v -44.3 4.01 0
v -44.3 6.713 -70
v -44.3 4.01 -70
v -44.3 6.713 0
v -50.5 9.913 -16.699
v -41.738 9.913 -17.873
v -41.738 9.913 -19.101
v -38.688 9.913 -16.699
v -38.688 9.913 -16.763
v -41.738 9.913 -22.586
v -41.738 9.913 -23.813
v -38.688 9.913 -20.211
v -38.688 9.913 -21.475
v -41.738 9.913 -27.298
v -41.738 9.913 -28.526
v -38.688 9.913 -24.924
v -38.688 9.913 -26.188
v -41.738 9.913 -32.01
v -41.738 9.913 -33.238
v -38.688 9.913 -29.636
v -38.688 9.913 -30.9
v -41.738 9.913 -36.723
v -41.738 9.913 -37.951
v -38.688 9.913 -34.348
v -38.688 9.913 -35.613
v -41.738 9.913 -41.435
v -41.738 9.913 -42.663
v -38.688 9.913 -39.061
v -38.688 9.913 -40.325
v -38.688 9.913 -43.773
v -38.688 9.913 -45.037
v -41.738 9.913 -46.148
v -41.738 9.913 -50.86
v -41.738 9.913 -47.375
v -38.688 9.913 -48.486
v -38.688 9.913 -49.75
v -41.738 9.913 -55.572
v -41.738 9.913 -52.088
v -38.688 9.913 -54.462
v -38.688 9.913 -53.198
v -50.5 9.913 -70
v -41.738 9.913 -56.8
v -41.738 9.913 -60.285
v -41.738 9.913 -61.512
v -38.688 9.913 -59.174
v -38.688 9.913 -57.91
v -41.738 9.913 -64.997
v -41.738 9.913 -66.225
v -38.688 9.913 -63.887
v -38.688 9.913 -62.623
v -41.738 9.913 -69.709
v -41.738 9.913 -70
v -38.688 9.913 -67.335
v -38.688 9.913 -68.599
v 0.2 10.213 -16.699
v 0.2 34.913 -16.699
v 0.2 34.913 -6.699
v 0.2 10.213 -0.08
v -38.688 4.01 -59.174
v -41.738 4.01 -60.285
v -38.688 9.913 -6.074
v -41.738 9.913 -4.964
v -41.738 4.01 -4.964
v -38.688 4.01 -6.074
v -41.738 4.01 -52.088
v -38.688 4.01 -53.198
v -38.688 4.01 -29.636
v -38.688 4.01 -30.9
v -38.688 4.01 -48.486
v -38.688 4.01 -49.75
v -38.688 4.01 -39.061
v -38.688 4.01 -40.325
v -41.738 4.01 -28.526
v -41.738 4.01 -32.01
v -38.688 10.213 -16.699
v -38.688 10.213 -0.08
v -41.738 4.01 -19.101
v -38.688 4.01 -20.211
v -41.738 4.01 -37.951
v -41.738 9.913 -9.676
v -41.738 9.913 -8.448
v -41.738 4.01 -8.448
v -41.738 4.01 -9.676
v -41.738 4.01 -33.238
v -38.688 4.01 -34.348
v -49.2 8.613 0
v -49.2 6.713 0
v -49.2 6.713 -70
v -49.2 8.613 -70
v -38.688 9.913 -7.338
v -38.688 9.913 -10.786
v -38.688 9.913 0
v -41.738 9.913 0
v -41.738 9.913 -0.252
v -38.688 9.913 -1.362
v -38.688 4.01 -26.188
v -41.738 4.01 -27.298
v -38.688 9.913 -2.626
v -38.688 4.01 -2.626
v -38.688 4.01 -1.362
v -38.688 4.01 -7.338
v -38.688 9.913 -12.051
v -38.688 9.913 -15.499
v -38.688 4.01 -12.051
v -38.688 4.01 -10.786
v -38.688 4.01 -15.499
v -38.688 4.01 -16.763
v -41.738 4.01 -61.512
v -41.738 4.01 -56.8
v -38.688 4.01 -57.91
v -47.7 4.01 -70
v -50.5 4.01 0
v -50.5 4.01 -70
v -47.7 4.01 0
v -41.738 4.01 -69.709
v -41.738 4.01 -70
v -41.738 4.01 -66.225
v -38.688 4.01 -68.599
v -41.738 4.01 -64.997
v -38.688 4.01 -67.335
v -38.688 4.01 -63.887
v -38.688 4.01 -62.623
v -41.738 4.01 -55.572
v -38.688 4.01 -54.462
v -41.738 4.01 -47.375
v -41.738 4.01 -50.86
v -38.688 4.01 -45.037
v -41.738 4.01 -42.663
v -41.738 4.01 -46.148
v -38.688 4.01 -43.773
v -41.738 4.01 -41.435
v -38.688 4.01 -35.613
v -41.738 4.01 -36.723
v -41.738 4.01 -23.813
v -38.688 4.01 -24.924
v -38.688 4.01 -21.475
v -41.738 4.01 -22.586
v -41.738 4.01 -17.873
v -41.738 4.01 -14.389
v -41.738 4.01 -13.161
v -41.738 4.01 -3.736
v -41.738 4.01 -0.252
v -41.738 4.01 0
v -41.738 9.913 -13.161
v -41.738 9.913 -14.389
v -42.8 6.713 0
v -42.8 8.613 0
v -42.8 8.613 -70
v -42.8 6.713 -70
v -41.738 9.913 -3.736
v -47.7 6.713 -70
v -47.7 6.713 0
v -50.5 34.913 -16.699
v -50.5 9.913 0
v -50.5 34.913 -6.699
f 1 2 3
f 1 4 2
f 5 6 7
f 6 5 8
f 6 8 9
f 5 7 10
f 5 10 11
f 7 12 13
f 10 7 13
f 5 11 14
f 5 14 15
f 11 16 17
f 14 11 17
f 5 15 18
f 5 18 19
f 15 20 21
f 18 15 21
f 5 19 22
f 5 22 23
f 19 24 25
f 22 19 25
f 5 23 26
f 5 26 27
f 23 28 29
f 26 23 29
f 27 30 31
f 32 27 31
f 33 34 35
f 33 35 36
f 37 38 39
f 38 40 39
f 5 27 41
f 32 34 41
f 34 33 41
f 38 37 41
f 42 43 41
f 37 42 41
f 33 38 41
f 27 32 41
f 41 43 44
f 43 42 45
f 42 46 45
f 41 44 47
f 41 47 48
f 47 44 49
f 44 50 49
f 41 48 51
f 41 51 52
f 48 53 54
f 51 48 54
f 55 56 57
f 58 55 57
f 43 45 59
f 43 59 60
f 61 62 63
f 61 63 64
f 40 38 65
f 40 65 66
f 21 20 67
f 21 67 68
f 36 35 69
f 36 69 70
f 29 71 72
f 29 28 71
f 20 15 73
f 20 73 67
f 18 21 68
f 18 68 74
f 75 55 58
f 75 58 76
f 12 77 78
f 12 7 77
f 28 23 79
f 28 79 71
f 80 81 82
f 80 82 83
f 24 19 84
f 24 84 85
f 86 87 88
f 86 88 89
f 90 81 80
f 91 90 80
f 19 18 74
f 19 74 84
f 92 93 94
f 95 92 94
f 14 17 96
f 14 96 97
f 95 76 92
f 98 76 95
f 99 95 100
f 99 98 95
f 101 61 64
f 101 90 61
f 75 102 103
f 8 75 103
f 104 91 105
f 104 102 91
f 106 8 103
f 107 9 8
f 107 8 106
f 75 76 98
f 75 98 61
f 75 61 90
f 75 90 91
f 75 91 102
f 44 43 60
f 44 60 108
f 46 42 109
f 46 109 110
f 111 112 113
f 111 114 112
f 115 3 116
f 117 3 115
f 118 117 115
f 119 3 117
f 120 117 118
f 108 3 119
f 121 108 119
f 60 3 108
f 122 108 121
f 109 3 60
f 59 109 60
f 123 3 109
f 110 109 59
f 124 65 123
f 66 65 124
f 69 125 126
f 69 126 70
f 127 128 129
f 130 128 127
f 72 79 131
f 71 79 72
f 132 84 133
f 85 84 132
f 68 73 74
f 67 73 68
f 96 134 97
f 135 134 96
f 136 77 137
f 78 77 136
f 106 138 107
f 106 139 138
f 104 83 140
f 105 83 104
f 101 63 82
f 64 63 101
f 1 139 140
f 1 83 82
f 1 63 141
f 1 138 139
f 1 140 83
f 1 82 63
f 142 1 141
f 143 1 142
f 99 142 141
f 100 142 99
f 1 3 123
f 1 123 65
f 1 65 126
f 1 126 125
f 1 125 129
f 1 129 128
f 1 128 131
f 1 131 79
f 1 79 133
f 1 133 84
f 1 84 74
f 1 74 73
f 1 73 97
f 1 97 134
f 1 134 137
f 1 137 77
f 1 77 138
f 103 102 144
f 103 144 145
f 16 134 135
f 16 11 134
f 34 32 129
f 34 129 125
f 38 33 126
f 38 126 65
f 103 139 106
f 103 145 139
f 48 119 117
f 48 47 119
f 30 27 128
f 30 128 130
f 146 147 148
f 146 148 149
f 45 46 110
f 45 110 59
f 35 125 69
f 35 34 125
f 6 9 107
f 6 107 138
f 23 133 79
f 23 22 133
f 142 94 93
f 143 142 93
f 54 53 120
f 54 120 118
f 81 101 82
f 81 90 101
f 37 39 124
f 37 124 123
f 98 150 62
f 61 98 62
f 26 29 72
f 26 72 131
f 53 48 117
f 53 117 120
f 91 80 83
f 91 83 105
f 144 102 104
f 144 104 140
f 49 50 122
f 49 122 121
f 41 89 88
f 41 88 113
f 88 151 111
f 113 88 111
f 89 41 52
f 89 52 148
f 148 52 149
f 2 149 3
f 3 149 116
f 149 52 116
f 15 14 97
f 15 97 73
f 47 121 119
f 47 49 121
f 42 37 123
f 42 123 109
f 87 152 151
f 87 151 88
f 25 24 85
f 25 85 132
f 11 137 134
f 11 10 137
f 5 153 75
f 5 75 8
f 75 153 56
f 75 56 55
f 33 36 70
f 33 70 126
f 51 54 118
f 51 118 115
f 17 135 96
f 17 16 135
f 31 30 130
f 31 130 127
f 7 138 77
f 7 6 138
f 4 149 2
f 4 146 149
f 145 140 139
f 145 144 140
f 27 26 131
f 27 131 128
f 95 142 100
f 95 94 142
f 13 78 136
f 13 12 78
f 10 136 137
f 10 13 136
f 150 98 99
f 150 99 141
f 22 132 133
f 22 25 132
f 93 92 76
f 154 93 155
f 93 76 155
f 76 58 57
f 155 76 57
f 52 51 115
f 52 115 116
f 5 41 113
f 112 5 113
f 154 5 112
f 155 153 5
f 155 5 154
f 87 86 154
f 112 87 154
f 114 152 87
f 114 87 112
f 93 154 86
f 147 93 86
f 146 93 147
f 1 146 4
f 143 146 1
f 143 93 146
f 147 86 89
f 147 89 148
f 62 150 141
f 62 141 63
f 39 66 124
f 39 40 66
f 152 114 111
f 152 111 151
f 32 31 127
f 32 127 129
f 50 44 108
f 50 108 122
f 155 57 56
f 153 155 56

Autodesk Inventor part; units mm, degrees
ref_plane "YZ Plane" through (0, 0, 0) normal (1, 0, 0) x (0, 1, 0)
ref_plane "XZ Plane" through (0, 0, 0) normal (0, 1, 0) x (-1, 0, 0)
sketch "草圖1" plane through (0, 0, 0) normal (0, 0, 1) x (1, 0, 0)
  line L0 (0, -4.2926) -> (-50, -4.2926) projected
  line L1 (0, -4.2926) -> (0, 3.81) projected
  line L2 (0, 3.81) -> (-2.5, 3.81) projected
  line L3 (-2.5, 3.81) -> (-2.5, 6.9129) projected
  line L4 (-2.5, 6.9129) -> (-1, 6.9129) projected
  line L5 (-1, 6.9129) -> (-1, 8.4129) projected
  line L6 (-1, 8.4129) -> (-7, 8.4129) projected
  line L7 (-7, 8.4129) -> (-7, 6.9129) projected
  line L8 (-7, 6.9129) -> (-5.5, 6.9129) projected
  line L9 (-5.5, 6.9129) -> (-5.5, 3.81) projected
  line L10 (-5.5, 3.81) -> (-44.5, 3.81) projected
  line L11 (-44.5, 3.81) -> (-44.5, 6.9129) projected
  line L12 (-44.5, 6.9129) -> (-43, 6.9129) projected
  line L13 (-43, 6.9129) -> (-43, 8.4129) projected
  line L14 (-43, 8.4129) -> (-49, 8.4129) projected
  line L15 (-49, 8.4129) -> (-49, 6.9129) projected
  line L16 (-49, 6.9129) -> (-47.5, 6.9129) projected
  line L17 (-47.5, 6.9129) -> (-47.5, 3.81) projected
  line L18 (-47.5, 3.81) -> (-50, 3.81) projected
  line L19 (-50, -4.2926) -> (-50, 3.81) projected
  line L20 (-44.3, 6.7129) -> (-44.3, 4.01)
  line L21 (-44.3, 4.01) -> (-5.7, 4.01)
  line L22 (-5.7, 4.01) -> (-5.7, 6.7129)
  line L23 (-5.7, 6.7129) -> (-7.2, 6.7129)
  line L24 (-7.2, 6.7129) -> (-7.2, 8.6129)
  line L25 (-7.2, 8.6129) -> (-0.8, 8.6129)
  line L26 (-0.8, 8.6129) -> (-0.8, 6.7129)
  line L27 (-0.8, 6.7129) -> (-2.3, 6.7129)
  line L28 (-2.3, 6.7129) -> (-2.3, 4.01)
  line L29 (-2.3, 4.01) -> (0.2, 4.01)
  line L30 (0.2, 4.01) -> (0.2, -4.4926)
  line L31 (0.2, -4.4926) -> (-50.2, -4.4926)
  line L32 (-50.2, -4.4926) -> (-50.2, 4.01)
  line L33 (-50.2, 4.01) -> (-47.7, 4.01)
  line L34 (-47.7, 4.01) -> (-47.7, 6.7129)
  line L35 (-47.7, 6.7129) -> (-49.2, 6.7129)
  line L36 (-49.2, 6.7129) -> (-49.2, 8.6129)
  line L37 (-49.2, 8.6129) -> (-42.8, 8.6129)
  line L38 (-42.8, 8.6129) -> (-42.8, 6.7129)
  line L39 (-42.8, 6.7129) -> (-44.3, 6.7129)
  line L40 (-50.2, 4.01) -> (-50.2, 9.9129)
  line L41 (-50.2, 9.9129) -> (-41.8, 9.9129)
  line L42 (-41.8, 9.9129) -> (-41.8, 4.01)
  line L43 (-41.8, 6.7405) -> (-41.8, 4.0405)
  point P0 (0, 0)
  point P1 (-41.8, 5.3905)
  dimension "d0" = 0.2
  dimension "d3" = 1
  dimension "d4" = 1.3
ref_plane "工作平面1" through (-50, -4.2926, -70) normal (0, 0, -1) x (0, 1, 0)
extrude "擠出1" add sketch "草圖1" against normal up to surface (70 mm away) contours L39 L38 L37 L36 L35 L34 L33 L40 L41 L42 L21 L20
sketch "草圖2" plane through (-50.2, 9.9129, 0) normal (0, 1, 0) x (1, 0, 0)
  line L0 (8.4617, 19.101) -> (11.5117, 20.2111)
  line L1 (11.5117, 20.2111) -> (11.5117, 21.4754)
  line L2 (11.5117, 21.4754) -> (8.4617, 22.5855)
  line L3 (8.4617, 22.5855) -> (8.4617, 23.8134)
  line L4 (8.4617, 23.8134) -> (11.5117, 24.9235)
  line L5 (11.5117, 24.9235) -> (11.5117, 26.1878)
  line L6 (11.5117, 26.1878) -> (8.4617, 27.2979)
  line L7 (8.4617, 27.2979) -> (8.4617, 28.5258)
  line L8 (8.4617, 28.5258) -> (11.5117, 29.6359)
  line L9 (11.5117, 29.6359) -> (11.5117, 30.9002)
  line L10 (11.5117, 30.9002) -> (8.4617, 32.0103)
  line L11 (8.4617, 32.0103) -> (8.4617, 33.2382)
  line L12 (8.4617, 33.2382) -> (11.5117, 34.3483)
  line L13 (11.5117, 34.3483) -> (11.5117, 35.6126)
  line L14 (11.5117, 35.6126) -> (8.4617, 36.7227)
  line L15 (8.4617, 36.7227) -> (8.4617, 37.9506)
  line L16 (8.4617, 37.9506) -> (11.5117, 39.0607)
  line L17 (11.5117, 39.0607) -> (11.5117, 40.325)
  line L18 (11.5117, 40.325) -> (8.4617, 41.4351)
  line L19 (8.4617, 41.4351) -> (8.4617, 42.663)
  line L20 (8.4617, 42.663) -> (11.5117, 43.7731)
  line L21 (11.5117, 43.7731) -> (11.5117, 45.0373)
  line L22 (11.5117, 45.0373) -> (8.4617, 46.1475)
  line L23 (8.4617, 46.1475) -> (8.4617, 47.3753)
  line L24 (8.4617, 47.3753) -> (11.5117, 48.4855)
  line L25 (11.5117, 48.4855) -> (11.5117, 49.7497)
  line L26 (11.5117, 49.7497) -> (8.4617, 50.8598)
  circle A0 centre (25.2, 35) radius 1.15 projected
  spline S0 degree 3 poles (28.303, 18.8298) (28.3918, 19.076) (28.7004, 19.9315) (28.7388, 21.2949) (28.6496, 21.419) (28.6524, 21.7961) (28.6611, 21.9313) (28.7622, 22.2015) (28.8309, 22.282) (28.9256, 22.387) (29.0049, 22.4333) (29.139, 22.5114) (29.2816, 22.5522) (29.5147, 22.6052) (29.6038, 22.5977) (29.679, 22.5914) (29.7699, 22.5777) (29.9387, 22.4894) (30.0374, 22.4306) (30.278, 22.1628) (30.3615, 21.9889) (30.5339, 21.6254) (30.761, 21.3363) (31.4807, 20.5784) (31.9907, 20.2322) (32.1942, 20.0941) knots 0 0 0 0 0.078525 0.078525 0.123346 0.123346 0.136441 0.136441 0.149096 0.149096 0.177084 0.177084 0.558526 0.558526 0.807734 0.807734 2.330173 2.330173 3.026337 3.026337 3.902772 3.902772 11.004243 11.004243 24.626338 24.626338 24.626338 24.626338 projected
  arc A1 (32.1942, 20.0941) -> (33.148, 20.5801) centre (25.2, 35) ccw projected
  spline S1 degree 3 poles (33.148, 20.5801) (33.1564, 20.8417) (33.1855, 21.7507) (32.8007, 23.0592) (32.6775, 23.1497) (32.5637, 23.5092) (32.5301, 23.6405) (32.5428, 23.9287) (32.5833, 24.0265) (32.6409, 24.1556) (32.702, 24.2241) (32.8054, 24.3399) (32.9285, 24.4227) (33.1337, 24.5452) (33.2208, 24.5656) (33.2942, 24.5828) (33.3849, 24.5979) (33.5727, 24.566) (33.6848, 24.5406) (33.9964, 24.3602) (34.1295, 24.2207) (34.4058, 23.9282) (34.7112, 23.7235) (35.6298, 23.2251) (36.2218, 23.0535) (36.458, 22.985) knots 0 0 0 0 0.078525 0.078525 0.123346 0.123346 0.136441 0.136441 0.149096 0.149096 0.177084 0.177084 0.558526 0.558526 0.807734 0.807734 2.330173 2.330173 3.026337 3.026337 3.902772 3.902772 11.004243 11.004243 24.626338 24.626338 24.626338 24.626338 projected
  arc A2 (36.458, 22.985) -> (37.215, 23.742) centre (25.2, 35) ccw projected
  spline S2 degree 3 poles (37.215, 23.742) (37.1421, 23.9934) (36.889, 24.8668) (36.1186, 25.9924) (35.9735, 26.0404) (35.7541, 26.3471) (35.6817, 26.4616) (35.6047, 26.7396) (35.6129, 26.8451) (35.6278, 26.9857) (35.6648, 27.0698) (35.7273, 27.2118) (35.8188, 27.3286) (35.9762, 27.5085) (36.0526, 27.5549) (36.1172, 27.5939) (36.1988, 27.6363) (36.3872, 27.664) (36.5016, 27.6744) (36.8537, 27.5992) (37.0234, 27.5077) (37.3766, 27.3148) (37.7303, 27.2145) (38.758, 27.0244) (39.3741, 27.0441) (39.6199, 27.052) knots 0 0 0 0 0.078525 0.078525 0.123346 0.123346 0.136441 0.136441 0.149096 0.149096 0.177084 0.177084 0.558526 0.558526 0.807734 0.807734 2.330173 2.330173 3.026337 3.026337 3.902772 3.902772 11.004243 11.004243 24.626338 24.626338 24.626338 24.626338 projected
  arc A3 (39.6199, 27.052) -> (40.1059, 28.0058) centre (25.2, 35) ccw projected
  spline S3 degree 3 poles (40.1059, 28.0058) (39.9589, 28.2224) (39.4482, 28.9749) (38.3677, 29.8073) (38.2149, 29.8081) (37.9115, 30.032) (37.8072, 30.1185) (37.648, 30.3591) (37.6233, 30.462) (37.594, 30.6003) (37.6032, 30.6917) (37.6187, 30.8461) (37.6696, 30.9855) (37.7637, 31.2052) (37.8221, 31.2729) (37.8714, 31.33) (37.9359, 31.3955) (38.1066, 31.4801) (38.2122, 31.5254) (38.5703, 31.5626) (38.76, 31.528) (39.1555, 31.4538) (39.5228, 31.4677) (40.559, 31.6044) (41.1388, 31.8135) (41.3702, 31.897) knots 0 0 0 0 0.078525 0.078525 0.123346 0.123346 0.136441 0.136441 0.149096 0.149096 0.177084 0.177084 0.558526 0.558526 0.807734 0.807734 2.330173 2.330173 3.026337 3.026337 3.902772 3.902772 11.004243 11.004243 24.626338 24.626338 24.626338 24.626338 projected
  arc A4 (41.3702, 31.897) -> (41.5376, 32.9543) centre (25.2, 35) ccw projected
  spline S4 degree 3 poles (41.5376, 32.9543) (41.3309, 33.1148) (40.6127, 33.6727) (39.3279, 34.1305) (39.1823, 34.0841) (38.8245, 34.2032) (38.6986, 34.2532) (38.4729, 34.4329) (38.4176, 34.5231) (38.3469, 34.6456) (38.3275, 34.7353) (38.2946, 34.887) (38.2999, 35.0353) (38.3215, 35.2733) (38.3561, 35.3558) (38.3854, 35.4253) (38.4264, 35.5076) (38.5627, 35.6407) (38.6491, 35.7164) (38.9781, 35.8625) (39.1693, 35.8882) (39.5683, 35.9398) (39.9134, 36.0665) (40.8566, 36.5168) (41.3434, 36.8949) (41.5376, 37.0457) knots 0 0 0 0 0.078525 0.078525 0.123346 0.123346 0.136441 0.136441 0.149096 0.149096 0.177084 0.177084 0.558526 0.558526 0.807734 0.807734 2.330173 2.330173 3.026337 3.026337 3.902772 3.902772 11.004243 11.004243 24.626338 24.626338 24.626338 24.626338 projected
  arc A5 (41.5376, 37.0457) -> (41.3702, 38.103) centre (25.2, 35) ccw projected
  spline S5 degree 3 poles (41.3702, 38.103) (41.124, 38.1918) (40.2685, 38.5004) (38.9051, 38.5388) (38.781, 38.4496) (38.4039, 38.4524) (38.2687, 38.4611) (37.9985, 38.5622) (37.918, 38.6309) (37.813, 38.7256) (37.7667, 38.8049) (37.6886, 38.939) (37.6478, 39.0816) (37.5948, 39.3147) (37.6023, 39.4038) (37.6086, 39.479) (37.6223, 39.5699) (37.7106, 39.7387) (37.7694, 39.8374) (38.0372, 40.078) (38.2111, 40.1615) (38.5746, 40.3339) (38.8637, 40.561) (39.6216, 41.2807) (39.9678, 41.7907) (40.1059, 41.9942) knots 0 0 0 0 0.078525 0.078525 0.123346 0.123346 0.136441 0.136441 0.149096 0.149096 0.177084 0.177084 0.558526 0.558526 0.807734 0.807734 2.330173 2.330173 3.026337 3.026337 3.902772 3.902772 11.004243 11.004243 24.626338 24.626338 24.626338 24.626338 projected
  arc A6 (40.1059, 41.9942) -> (39.6199, 42.948) centre (25.2, 35) ccw projected
  spline S6 degree 3 poles (39.6199, 42.948) (39.3583, 42.9564) (38.4493, 42.9855) (37.1408, 42.6007) (37.0503, 42.4775) (36.6908, 42.3637) (36.5595, 42.3301) (36.2713, 42.3428) (36.1735, 42.3833) (36.0444, 42.4409) (35.9759, 42.502) (35.8601, 42.6054) (35.7773, 42.7285) (35.6548, 42.9337) (35.6344, 43.0208) (35.6172, 43.0942) (35.6021, 43.1849) (35.634, 43.3727) (35.6594, 43.4848) (35.8398, 43.7964) (35.9793, 43.9295) (36.2718, 44.2058) (36.4765, 44.5112) (36.9749, 45.4298) (37.1465, 46.0218) (37.215, 46.258) knots 0 0 0 0 0.078525 0.078525 0.123346 0.123346 0.136441 0.136441 0.149096 0.149096 0.177084 0.177084 0.558526 0.558526 0.807734 0.807734 2.330173 2.330173 3.026337 3.026337 3.902772 3.902772 11.004243 11.004243 24.626338 24.626338 24.626338 24.626338 projected
  arc A7 (37.215, 46.258) -> (36.458, 47.015) centre (25.2, 35) ccw projected
  spline S7 degree 3 poles (36.458, 47.015) (36.2066, 46.9421) (35.3332, 46.689) (34.2076, 45.9186) (34.1596, 45.7735) (33.8529, 45.5541) (33.7384, 45.4817) (33.4604, 45.4047) (33.3549, 45.4129) (33.2143, 45.4278) (33.1302, 45.4648) (32.9882, 45.5273) (32.8714, 45.6188) (32.6915, 45.7762) (32.6451, 45.8526) (32.6061, 45.9172) (32.5637, 45.9988) (32.536, 46.1872) (32.5256, 46.3016) (32.6008, 46.6537) (32.6923, 46.8234) (32.8852, 47.1766) (32.9855, 47.5303) (33.1756, 48.558) (33.1559, 49.1741) (33.148, 49.4199) knots 0 0 0 0 0.078525 0.078525 0.123346 0.123346 0.136441 0.136441 0.149096 0.149096 0.177084 0.177084 0.558526 0.558526 0.807734 0.807734 2.330173 2.330173 3.026337 3.026337 3.902772 3.902772 11.004242 11.004242 24.626338 24.626338 24.626338 24.626338 projected
  arc A8 (33.148, 49.4199) -> (32.1942, 49.9059) centre (25.2, 35) ccw projected
  spline S8 degree 3 poles (32.1942, 49.9059) (31.9776, 49.7589) (31.2251, 49.2482) (30.3927, 48.1677) (30.3919, 48.0149) (30.168, 47.7115) (30.0815, 47.6072) (29.8409, 47.448) (29.738, 47.4233) (29.5997, 47.394) (29.5083, 47.4032) (29.3539, 47.4187) (29.2145, 47.4696) (28.9948, 47.5637) (28.9271, 47.6221) (28.87, 47.6714) (28.8045, 47.7359) (28.7199, 47.9066) (28.6746, 48.0122) (28.6374, 48.3703) (28.672, 48.56) (28.7462, 48.9555) (28.7323, 49.3228) (28.5956, 50.359) (28.3865, 50.9388) (28.303, 51.1702) knots 0 0 0 0 0.078525 0.078525 0.123346 0.123346 0.136441 0.136441 0.149096 0.149096 0.177084 0.177084 0.558526 0.558526 0.807734 0.807734 2.330173 2.330173 3.026337 3.026337 3.902772 3.902772 11.004243 11.004243 24.626338 24.626338 24.626338 24.626338 projected
  arc A9 (28.303, 51.1702) -> (27.2457, 51.3376) centre (25.2, 35) ccw projected
  spline S9 degree 3 poles (27.2457, 51.3376) (27.0852, 51.1309) (26.5273, 50.4127) (26.0695, 49.1279) (26.1159, 48.9823) (25.9968, 48.6245) (25.9468, 48.4986) (25.7671, 48.2729) (25.6769, 48.2176) (25.5544, 48.1469) (25.4647, 48.1275) (25.313, 48.0946) (25.1647, 48.0999) (24.9267, 48.1215) (24.8442, 48.1561) (24.7747, 48.1854) (24.6924, 48.2264) (24.5593, 48.3627) (24.4836, 48.4491) (24.3375, 48.7781) (24.3118, 48.9693) (24.2602, 49.3683) (24.1335, 49.7134) (23.6832, 50.6566) (23.3051, 51.1434) (23.1543, 51.3376) knots 0 0 0 0 0.078525 0.078525 0.123346 0.123346 0.136441 0.136441 0.149096 0.149096 0.177084 0.177084 0.558526 0.558526 0.807734 0.807734 2.330173 2.330173 3.026337 3.026337 3.902772 3.902772 11.004243 11.004243 24.626338 24.626338 24.626338 24.626338 projected
  arc A10 (23.1543, 51.3376) -> (22.097, 51.1702) centre (25.2, 35) ccw projected
  spline S10 degree 3 poles (22.097, 51.1702) (22.0082, 50.924) (21.6996, 50.0685) (21.6612, 48.7051) (21.7504, 48.581) (21.7476, 48.2039) (21.7389, 48.0687) (21.6378, 47.7985) (21.5691, 47.718) (21.4744, 47.613) (21.3951, 47.5667) (21.261, 47.4886) (21.1184, 47.4478) (20.8853, 47.3948) (20.7962, 47.4023) (20.721, 47.4086) (20.6301, 47.4223) (20.4613, 47.5106) (20.3626, 47.5694) (20.122, 47.8372) (20.0385, 48.0111) (19.8661, 48.3746) (19.639, 48.6637) (18.9193, 49.4216) (18.4093, 49.7678) (18.2058, 49.9059) knots 0 0 0 0 0.078525 0.078525 0.123346 0.123346 0.136441 0.136441 0.149096 0.149096 0.177084 0.177084 0.558526 0.558526 0.807734 0.807734 2.330173 2.330173 3.026337 3.026337 3.902772 3.902772 11.004242 11.004242 24.626338 24.626338 24.626338 24.626338 projected
  arc A11 (18.2058, 49.9059) -> (17.252, 49.4199) centre (25.2, 35) ccw projected
  spline S11 degree 3 poles (17.252, 49.4199) (17.2436, 49.1583) (17.2145, 48.2493) (17.5993, 46.9408) (17.7225, 46.8503) (17.8363, 46.4908) (17.8699, 46.3595) (17.8572, 46.0713) (17.8167, 45.9735) (17.7591, 45.8444) (17.698, 45.7759) (17.5946, 45.6601) (17.4715, 45.5773) (17.2663, 45.4548) (17.1792, 45.4344) (17.1058, 45.4172) (17.0151, 45.4021) (16.8273, 45.434) (16.7152, 45.4594) (16.4036, 45.6398) (16.2705, 45.7793) (15.9942, 46.0718) (15.6888, 46.2765) (14.7702, 46.7749) (14.1782, 46.9465) (13.942, 47.015) knots 0 0 0 0 0.078525 0.078525 0.123346 0.123346 0.136441 0.136441 0.149096 0.149096 0.177084 0.177084 0.558526 0.558526 0.807734 0.807734 2.330173 2.330173 3.026337 3.026337 3.902772 3.902772 11.004243 11.004243 24.626338 24.626338 24.626338 24.626338 projected
  arc A12 (13.942, 47.015) -> (13.185, 46.258) centre (25.2, 35) ccw projected
  spline S12 degree 3 poles (13.185, 46.258) (13.2579, 46.0066) (13.511, 45.1332) (14.2814, 44.0076) (14.4265, 43.9596) (14.6459, 43.6529) (14.7183, 43.5384) (14.7953, 43.2604) (14.7871, 43.1549) (14.7722, 43.0143) (14.7352, 42.9302) (14.6727, 42.7882) (14.5812, 42.6714) (14.4238, 42.4915) (14.3474, 42.4451) (14.2828, 42.4061) (14.2012, 42.3637) (14.0128, 42.336) (13.8984, 42.3256) (13.5463, 42.4008) (13.3766, 42.4923) (13.0234, 42.6852) (12.6697, 42.7855) (11.642, 42.9756) (11.0259, 42.9559) (10.7801, 42.948) knots 0 0 0 0 0.078525 0.078525 0.123346 0.123346 0.136441 0.136441 0.149096 0.149096 0.177084 0.177084 0.558526 0.558526 0.807734 0.807734 2.330173 2.330173 3.026337 3.026337 3.902772 3.902772 11.004242 11.004242 24.626338 24.626338 24.626338 24.626338 projected
  arc A13 (10.7801, 42.948) -> (10.2941, 41.9942) centre (25.2, 35) ccw projected
  spline S13 degree 3 poles (10.2941, 41.9942) (10.4411, 41.7776) (10.9518, 41.0251) (12.0323, 40.1927) (12.1851, 40.1919) (12.4885, 39.968) (12.5928, 39.8815) (12.752, 39.6409) (12.7767, 39.538) (12.806, 39.3997) (12.7968, 39.3083) (12.7813, 39.1539) (12.7304, 39.0145) (12.6363, 38.7948) (12.5779, 38.7271) (12.5286, 38.67) (12.4641, 38.6045) (12.2934, 38.5199) (12.1878, 38.4746) (11.8297, 38.4374) (11.64, 38.472) (11.2445, 38.5462) (10.8772, 38.5323) (9.841, 38.3956) (9.2612, 38.1865) (9.0298, 38.103) knots 0 0 0 0 0.078525 0.078525 0.123346 0.123346 0.136441 0.136441 0.149096 0.149096 0.177084 0.177084 0.558526 0.558526 0.807734 0.807734 2.330173 2.330173 3.026337 3.026337 3.902772 3.902772 11.004243 11.004243 24.626338 24.626338 24.626338 24.626338 projected
  arc A14 (9.0298, 38.103) -> (8.8624, 37.0457) centre (25.2, 35) ccw projected
  spline S14 degree 3 poles (8.8624, 37.0457) (9.0691, 36.8852) (9.7873, 36.3273) (11.0721, 35.8695) (11.2177, 35.9159) (11.5755, 35.7968) (11.7014, 35.7468) (11.9271, 35.5671) (11.9824, 35.4769) (12.0531, 35.3544) (12.0725, 35.2647) (12.1054, 35.113) (12.1001, 34.9647) (12.0785, 34.7267) (12.0439, 34.6442) (12.0146, 34.5747) (11.9736, 34.4924) (11.8373, 34.3593) (11.7509, 34.2836) (11.4219, 34.1375) (11.2307, 34.1118) (10.8317, 34.0602) (10.4866, 33.9335) (9.5434, 33.4832) (9.0566, 33.1051) (8.8624, 32.9543) knots 0 0 0 0 0.078525 0.078525 0.123346 0.123346 0.136441 0.136441 0.149096 0.149096 0.177084 0.177084 0.558526 0.558526 0.807734 0.807734 2.330173 2.330173 3.026337 3.026337 3.902772 3.902772 11.004243 11.004243 24.626338 24.626338 24.626338 24.626338 projected
  arc A15 (8.8624, 32.9543) -> (9.0298, 31.897) centre (25.2, 35) ccw projected
  spline S15 degree 3 poles (9.0298, 31.897) (9.276, 31.8082) (10.1315, 31.4996) (11.4949, 31.4612) (11.619, 31.5504) (11.9961, 31.5476) (12.1313, 31.5389) (12.4015, 31.4378) (12.482, 31.3691) (12.587, 31.2744) (12.6333, 31.1951) (12.7114, 31.061) (12.7522, 30.9184) (12.8052, 30.6853) (12.7977, 30.5962) (12.7914, 30.521) (12.7777, 30.4301) (12.6894, 30.2613) (12.6306, 30.1626) (12.3628, 29.922) (12.1889, 29.8385) (11.8254, 29.6661) (11.5363, 29.439) (10.7784, 28.7193) (10.4322, 28.2093) (10.2941, 28.0058) knots 0 0 0 0 0.078525 0.078525 0.123346 0.123346 0.136441 0.136441 0.149096 0.149096 0.177084 0.177084 0.558526 0.558526 0.807734 0.807734 2.330173 2.330173 3.026337 3.026337 3.902772 3.902772 11.004243 11.004243 24.626338 24.626338 24.626338 24.626338 projected
  arc A16 (10.2941, 28.0058) -> (10.7801, 27.052) centre (25.2, 35) ccw projected
  spline S16 degree 3 poles (10.7801, 27.052) (11.0417, 27.0436) (11.9507, 27.0145) (13.2592, 27.3993) (13.3497, 27.5225) (13.7092, 27.6363) (13.8405, 27.6699) (14.1287, 27.6572) (14.2265, 27.6167) (14.3556, 27.5591) (14.4241, 27.498) (14.5399, 27.3946) (14.6227, 27.2715) (14.7452, 27.0663) (14.7656, 26.9792) (14.7828, 26.9058) (14.7979, 26.8151) (14.766, 26.6273) (14.7406, 26.5152) (14.5602, 26.2036) (14.4207, 26.0705) (14.1282, 25.7942) (13.9235, 25.4888) (13.4251, 24.5702) (13.2535, 23.9782) (13.185, 23.742) knots 0 0 0 0 0.078525 0.078525 0.123346 0.123346 0.136441 0.136441 0.149096 0.149096 0.177084 0.177084 0.558526 0.558526 0.807734 0.807734 2.330173 2.330173 3.026337 3.026337 3.902772 3.902772 11.004243 11.004243 24.626338 24.626338 24.626338 24.626338 projected
  arc A17 (13.185, 23.742) -> (13.942, 22.985) centre (25.2, 35) ccw projected
  spline S17 degree 3 poles (13.942, 22.985) (14.1934, 23.0579) (15.0668, 23.311) (16.1924, 24.0814) (16.2404, 24.2265) (16.5471, 24.4459) (16.6616, 24.5183) (16.9396, 24.5953) (17.0451, 24.5871) (17.1857, 24.5722) (17.2698, 24.5352) (17.4118, 24.4727) (17.5286, 24.3812) (17.7085, 24.2238) (17.7549, 24.1474) (17.7939, 24.0828) (17.8363, 24.0012) (17.864, 23.8128) (17.8744, 23.6984) (17.7992, 23.3463) (17.7077, 23.1766) (17.5148, 22.8234) (17.4145, 22.4697) (17.2244, 21.442) (17.2441, 20.8259) (17.252, 20.5801) knots 0 0 0 0 0.078525 0.078525 0.123346 0.123346 0.136441 0.136441 0.149096 0.149096 0.177084 0.177084 0.558526 0.558526 0.807734 0.807734 2.330173 2.330173 3.026337 3.026337 3.902772 3.902772 11.004243 11.004243 24.626338 24.626338 24.626338 24.626338 projected
  arc A18 (17.252, 20.5801) -> (18.2058, 20.0941) centre (25.2, 35) ccw projected
  spline S18 degree 3 poles (18.2058, 20.0941) (18.4224, 20.2411) (19.1749, 20.7518) (20.0073, 21.8323) (20.0081, 21.9851) (20.232, 22.2885) (20.3185, 22.3928) (20.5591, 22.552) (20.662, 22.5767) (20.8003, 22.606) (20.8917, 22.5968) (21.0461, 22.5813) (21.1855, 22.5304) (21.4052, 22.4363) (21.4729, 22.3779) (21.53, 22.3286) (21.5955, 22.2641) (21.6801, 22.0934) (21.7254, 21.9878) (21.7626, 21.6297) (21.728, 21.44) (21.6538, 21.0445) (21.6677, 20.6772) (21.8044, 19.641) (22.0135, 19.0612) (22.097, 18.8298) knots 0 0 0 0 0.078525 0.078525 0.123346 0.123346 0.136441 0.136441 0.149096 0.149096 0.177084 0.177084 0.558526 0.558526 0.807734 0.807734 2.330173 2.330173 3.026337 3.026337 3.902772 3.902772 11.004243 11.004243 24.626338 24.626338 24.626338 24.626338 projected
  arc A19 (22.097, 18.8298) -> (23.1543, 18.6624) centre (25.2, 35) ccw projected
  spline S19 degree 3 poles (23.1543, 18.6624) (23.3148, 18.8691) (23.8727, 19.5873) (24.3305, 20.8721) (24.2841, 21.0177) (24.4032, 21.3755) (24.4532, 21.5014) (24.6329, 21.7271) (24.7231, 21.7824) (24.8456, 21.8531) (24.9353, 21.8725) (25.087, 21.9054) (25.2353, 21.9001) (25.4733, 21.8785) (25.5558, 21.8439) (25.6253, 21.8146) (25.7076, 21.7736) (25.8407, 21.6373) (25.9164, 21.5509) (26.0625, 21.2219) (26.0882, 21.0307) (26.1398, 20.6317) (26.2665, 20.2866) (26.7168, 19.3434) (27.0949, 18.8566) (27.2457, 18.6624) knots 0 0 0 0 0.078525 0.078525 0.123346 0.123346 0.136441 0.136441 0.149096 0.149096 0.177084 0.177084 0.558526 0.558526 0.807734 0.807734 2.330173 2.330173 3.026337 3.026337 3.902772 3.902772 11.004243 11.004243 24.626338 24.626338 24.626338 24.626338 projected
  arc A20 (27.2457, 18.6624) -> (28.303, 18.8298) centre (25.2, 35) ccw projected
  line L27 (8.4, 70) -> (0, 70) projected
  line L28 (0, 0) -> (0, 70) projected
  line L29 (8.4, 0) -> (0, 0) projected
  line L30 (8.4, 0) -> (8.4, 70) projected
  line L31 (8.4617, 50.8598) -> (8.4617, 52.0877)
  line L32 (8.4617, 52.0877) -> (11.5117, 53.1978)
  line L33 (11.5117, 53.1978) -> (11.5117, 54.4621)
  line L34 (11.5117, 54.4621) -> (8.4617, 55.5722)
  line L35 (8.4617, 55.5722) -> (8.4617, 56.8001)
  line L36 (8.4617, 56.8001) -> (11.5117, 57.9102)
  line L37 (11.5117, 57.9102) -> (11.5117, 59.1745)
  line L38 (11.5117, 59.1745) -> (8.4617, 60.2846)
  line L39 (8.4617, 60.2846) -> (8.4617, 61.5125)
  line L40 (8.4617, 61.5125) -> (11.5117, 62.6226)
  line L41 (11.5117, 62.6226) -> (11.5117, 63.8869)
  line L42 (11.5117, 63.8869) -> (8.4617, 64.997)
  line L43 (8.4617, 64.997) -> (8.4617, 66.2249)
  line L44 (8.4617, 66.2249) -> (11.5117, 67.335)
  line L45 (11.5117, 67.335) -> (11.5117, 68.5993)
  line L46 (11.5117, 68.5993) -> (8.4617, 69.7094)
  line L47 (8.4617, 69.7094) -> (8.4617, 70)
  line L48 (8.4617, 70) -> (8.3127, 70)
  line L49 (8.1638, 0) -> (8.3127, 70)
  line L50 (8.4617, 14.3886) -> (11.5117, 15.4988)
  line L51 (11.5117, 15.4988) -> (11.5117, 16.763)
  line L52 (11.5117, 16.763) -> (8.4617, 17.8731)
  line L53 (8.4617, 17.8731) -> (8.4617, 19.101)
  line L54 (8.4617, 9.6763) -> (11.5117, 10.7864)
  line L55 (11.5117, 10.7864) -> (11.5117, 12.0506)
  line L56 (11.5117, 12.0506) -> (8.4617, 13.1608)
  line L57 (8.4617, 13.1608) -> (8.4617, 14.3886)
  line L58 (8.4617, 4.9639) -> (11.5117, 6.074)
  line L59 (11.5117, 6.074) -> (11.5117, 7.3383)
  line L60 (11.5117, 7.3383) -> (8.4617, 8.4484)
  line L61 (8.4617, 8.4484) -> (8.4617, 9.6763)
  line L62 (8.4617, 0.2515) -> (11.5117, 1.3616)
  line L63 (11.5117, 1.3616) -> (11.5117, 2.6259)
  line L64 (11.5117, 2.6259) -> (8.4617, 3.736)
  line L65 (8.4617, 3.736) -> (8.4617, 4.9639)
  line L66 (8.4617, 0.2515) -> (8.4617, 0)
  line L67 (8.4617, 0) -> (8.1638, 0)
  point P0 (50.2, 0)
  point P1 (8.4617, 3.736)
  point P2 (8.4617, 4.9639)
  point P3 (8.4617, 8.4484)
  point P4 (8.4617, 9.6763)
  point P5 (8.4617, 13.1608)
  point P6 (8.4617, 14.3886)
  point P7 (8.4617, 17.8731)
  point P8 (8.4617, 19.101)
  point P9 (8.4617, 22.5855)
  point P10 (8.4617, 23.8134)
  point P11 (8.4617, 27.2979)
  point P12 (8.4617, 28.5258)
  point P13 (8.4617, 32.0103)
  point P14 (8.4617, 33.2382)
  point P15 (8.4617, 36.7227)
  point P16 (8.4617, 37.9506)
  point P17 (8.4617, 41.4351)
  point P18 (8.4617, 42.663)
  point P19 (8.4617, 46.1475)
  point P20 (8.4617, 47.3753)
  point P21 (8.4617, 50.8598)
  point P22 (8.4617, 52.0877)
  point P23 (8.4617, 55.5722)
  point P24 (8.4617, 56.8001)
  point P25 (8.4617, 60.2846)
  point P26 (8.4617, 61.5125)
  point P27 (8.4617, 64.997)
  point P28 (8.4617, 66.2249)
extrude "擠出2" add sketch "草圖2" against normal up to surface (5.9029 mm away) contours L53 L52 L51 L50 L57 L56 L55 L54 L61 L60 L59 L58 L65 L64 L63 L62 L66 L67 L30 L48 L47 L46 L45 L44 L43 L42 L41 L40 L39 L38 L37 L36 L35 L34 L33 L32 L31 L26 L25 L24 L23 L22 L21 L20 L19 L18 L17 L16 L15 L14 L13 L12 L11 L10 L9 L8 L7 L6 L5 L4 L3 L2 L1 L0
sketch "草圖3" plane through (-50.2, 4.01, 0) normal (-1, 0, 0) x (0, 0, 1)
  line L0 (0, 5.9029) -> (-70, 5.9029) projected
  line L1 (0, 5.9029) -> (0, 0) projected
  line L2 (0, 5.9029) -> (-6.6987, 30.9029)
  line L3 (-6.6987, 30.9029) -> (-16.6987, 30.9029)
  line L4 (-16.6987, 30.9029) -> (-16.6987, 5.9029)
  point P0 (0, -4.01)
  dimension "d14" = 75
  dimension "d15" = 10
  dimension "d16" = 25
extrude "擠出3" add sketch "草圖3" against normal blind 50.4
sketch "草圖4" plane through (-50.2, 9.9129, -16.6987) normal (0, 0, -1) x (-1, 0, 0)
  line L0 (0, 25) -> (0, 0) projected
  line L1 (0, 25) -> (-50.4, 25) projected
  line L2 (-50.4, 0) -> (-50.4, 25) projected
  line L3 (-11.5117, 0) -> (-50.4, 0) projected
  line L4 (0, 0) -> (-11.5117, 0) projected
  line L5 (-50.4, 0.3) -> (-11.5117, 0.3)
  line L6 (-11.5117, 0.3) -> (-11.5117, 0)
  point P0 (-50.2, -9.9129)
  dimension "d19" = 0.3
extrude "擠出4" cut sketch "草圖4" against normal blind 50.4 contours L3 L2 L5 L6
sketch "草圖5" plane through (-50.2, 4.01, -70) normal (-1, 0, 0) x (0, 0, 1)
  line L0 (0, 5.9029) -> (0, 0) projected
  line L1 (70, 0) -> (0, 0) projected
  line L2 (70, 5.9029) -> (70, 0) projected
  line L3 (70, 5.9029) -> (63.3013, 30.9029) projected
  line L4 (63.3013, 30.9029) -> (53.3013, 30.9029) projected
  line L5 (53.3013, 30.9029) -> (53.3013, 5.9029) projected
  line L6 (53.3013, 5.9029) -> (0, 5.9029) projected
  point P0 (70, -4.01)
extrude "擠出5" add sketch "草圖5" along normal blind 0.3
properties part number "sg90 claw v2 finger_3D 列印"
